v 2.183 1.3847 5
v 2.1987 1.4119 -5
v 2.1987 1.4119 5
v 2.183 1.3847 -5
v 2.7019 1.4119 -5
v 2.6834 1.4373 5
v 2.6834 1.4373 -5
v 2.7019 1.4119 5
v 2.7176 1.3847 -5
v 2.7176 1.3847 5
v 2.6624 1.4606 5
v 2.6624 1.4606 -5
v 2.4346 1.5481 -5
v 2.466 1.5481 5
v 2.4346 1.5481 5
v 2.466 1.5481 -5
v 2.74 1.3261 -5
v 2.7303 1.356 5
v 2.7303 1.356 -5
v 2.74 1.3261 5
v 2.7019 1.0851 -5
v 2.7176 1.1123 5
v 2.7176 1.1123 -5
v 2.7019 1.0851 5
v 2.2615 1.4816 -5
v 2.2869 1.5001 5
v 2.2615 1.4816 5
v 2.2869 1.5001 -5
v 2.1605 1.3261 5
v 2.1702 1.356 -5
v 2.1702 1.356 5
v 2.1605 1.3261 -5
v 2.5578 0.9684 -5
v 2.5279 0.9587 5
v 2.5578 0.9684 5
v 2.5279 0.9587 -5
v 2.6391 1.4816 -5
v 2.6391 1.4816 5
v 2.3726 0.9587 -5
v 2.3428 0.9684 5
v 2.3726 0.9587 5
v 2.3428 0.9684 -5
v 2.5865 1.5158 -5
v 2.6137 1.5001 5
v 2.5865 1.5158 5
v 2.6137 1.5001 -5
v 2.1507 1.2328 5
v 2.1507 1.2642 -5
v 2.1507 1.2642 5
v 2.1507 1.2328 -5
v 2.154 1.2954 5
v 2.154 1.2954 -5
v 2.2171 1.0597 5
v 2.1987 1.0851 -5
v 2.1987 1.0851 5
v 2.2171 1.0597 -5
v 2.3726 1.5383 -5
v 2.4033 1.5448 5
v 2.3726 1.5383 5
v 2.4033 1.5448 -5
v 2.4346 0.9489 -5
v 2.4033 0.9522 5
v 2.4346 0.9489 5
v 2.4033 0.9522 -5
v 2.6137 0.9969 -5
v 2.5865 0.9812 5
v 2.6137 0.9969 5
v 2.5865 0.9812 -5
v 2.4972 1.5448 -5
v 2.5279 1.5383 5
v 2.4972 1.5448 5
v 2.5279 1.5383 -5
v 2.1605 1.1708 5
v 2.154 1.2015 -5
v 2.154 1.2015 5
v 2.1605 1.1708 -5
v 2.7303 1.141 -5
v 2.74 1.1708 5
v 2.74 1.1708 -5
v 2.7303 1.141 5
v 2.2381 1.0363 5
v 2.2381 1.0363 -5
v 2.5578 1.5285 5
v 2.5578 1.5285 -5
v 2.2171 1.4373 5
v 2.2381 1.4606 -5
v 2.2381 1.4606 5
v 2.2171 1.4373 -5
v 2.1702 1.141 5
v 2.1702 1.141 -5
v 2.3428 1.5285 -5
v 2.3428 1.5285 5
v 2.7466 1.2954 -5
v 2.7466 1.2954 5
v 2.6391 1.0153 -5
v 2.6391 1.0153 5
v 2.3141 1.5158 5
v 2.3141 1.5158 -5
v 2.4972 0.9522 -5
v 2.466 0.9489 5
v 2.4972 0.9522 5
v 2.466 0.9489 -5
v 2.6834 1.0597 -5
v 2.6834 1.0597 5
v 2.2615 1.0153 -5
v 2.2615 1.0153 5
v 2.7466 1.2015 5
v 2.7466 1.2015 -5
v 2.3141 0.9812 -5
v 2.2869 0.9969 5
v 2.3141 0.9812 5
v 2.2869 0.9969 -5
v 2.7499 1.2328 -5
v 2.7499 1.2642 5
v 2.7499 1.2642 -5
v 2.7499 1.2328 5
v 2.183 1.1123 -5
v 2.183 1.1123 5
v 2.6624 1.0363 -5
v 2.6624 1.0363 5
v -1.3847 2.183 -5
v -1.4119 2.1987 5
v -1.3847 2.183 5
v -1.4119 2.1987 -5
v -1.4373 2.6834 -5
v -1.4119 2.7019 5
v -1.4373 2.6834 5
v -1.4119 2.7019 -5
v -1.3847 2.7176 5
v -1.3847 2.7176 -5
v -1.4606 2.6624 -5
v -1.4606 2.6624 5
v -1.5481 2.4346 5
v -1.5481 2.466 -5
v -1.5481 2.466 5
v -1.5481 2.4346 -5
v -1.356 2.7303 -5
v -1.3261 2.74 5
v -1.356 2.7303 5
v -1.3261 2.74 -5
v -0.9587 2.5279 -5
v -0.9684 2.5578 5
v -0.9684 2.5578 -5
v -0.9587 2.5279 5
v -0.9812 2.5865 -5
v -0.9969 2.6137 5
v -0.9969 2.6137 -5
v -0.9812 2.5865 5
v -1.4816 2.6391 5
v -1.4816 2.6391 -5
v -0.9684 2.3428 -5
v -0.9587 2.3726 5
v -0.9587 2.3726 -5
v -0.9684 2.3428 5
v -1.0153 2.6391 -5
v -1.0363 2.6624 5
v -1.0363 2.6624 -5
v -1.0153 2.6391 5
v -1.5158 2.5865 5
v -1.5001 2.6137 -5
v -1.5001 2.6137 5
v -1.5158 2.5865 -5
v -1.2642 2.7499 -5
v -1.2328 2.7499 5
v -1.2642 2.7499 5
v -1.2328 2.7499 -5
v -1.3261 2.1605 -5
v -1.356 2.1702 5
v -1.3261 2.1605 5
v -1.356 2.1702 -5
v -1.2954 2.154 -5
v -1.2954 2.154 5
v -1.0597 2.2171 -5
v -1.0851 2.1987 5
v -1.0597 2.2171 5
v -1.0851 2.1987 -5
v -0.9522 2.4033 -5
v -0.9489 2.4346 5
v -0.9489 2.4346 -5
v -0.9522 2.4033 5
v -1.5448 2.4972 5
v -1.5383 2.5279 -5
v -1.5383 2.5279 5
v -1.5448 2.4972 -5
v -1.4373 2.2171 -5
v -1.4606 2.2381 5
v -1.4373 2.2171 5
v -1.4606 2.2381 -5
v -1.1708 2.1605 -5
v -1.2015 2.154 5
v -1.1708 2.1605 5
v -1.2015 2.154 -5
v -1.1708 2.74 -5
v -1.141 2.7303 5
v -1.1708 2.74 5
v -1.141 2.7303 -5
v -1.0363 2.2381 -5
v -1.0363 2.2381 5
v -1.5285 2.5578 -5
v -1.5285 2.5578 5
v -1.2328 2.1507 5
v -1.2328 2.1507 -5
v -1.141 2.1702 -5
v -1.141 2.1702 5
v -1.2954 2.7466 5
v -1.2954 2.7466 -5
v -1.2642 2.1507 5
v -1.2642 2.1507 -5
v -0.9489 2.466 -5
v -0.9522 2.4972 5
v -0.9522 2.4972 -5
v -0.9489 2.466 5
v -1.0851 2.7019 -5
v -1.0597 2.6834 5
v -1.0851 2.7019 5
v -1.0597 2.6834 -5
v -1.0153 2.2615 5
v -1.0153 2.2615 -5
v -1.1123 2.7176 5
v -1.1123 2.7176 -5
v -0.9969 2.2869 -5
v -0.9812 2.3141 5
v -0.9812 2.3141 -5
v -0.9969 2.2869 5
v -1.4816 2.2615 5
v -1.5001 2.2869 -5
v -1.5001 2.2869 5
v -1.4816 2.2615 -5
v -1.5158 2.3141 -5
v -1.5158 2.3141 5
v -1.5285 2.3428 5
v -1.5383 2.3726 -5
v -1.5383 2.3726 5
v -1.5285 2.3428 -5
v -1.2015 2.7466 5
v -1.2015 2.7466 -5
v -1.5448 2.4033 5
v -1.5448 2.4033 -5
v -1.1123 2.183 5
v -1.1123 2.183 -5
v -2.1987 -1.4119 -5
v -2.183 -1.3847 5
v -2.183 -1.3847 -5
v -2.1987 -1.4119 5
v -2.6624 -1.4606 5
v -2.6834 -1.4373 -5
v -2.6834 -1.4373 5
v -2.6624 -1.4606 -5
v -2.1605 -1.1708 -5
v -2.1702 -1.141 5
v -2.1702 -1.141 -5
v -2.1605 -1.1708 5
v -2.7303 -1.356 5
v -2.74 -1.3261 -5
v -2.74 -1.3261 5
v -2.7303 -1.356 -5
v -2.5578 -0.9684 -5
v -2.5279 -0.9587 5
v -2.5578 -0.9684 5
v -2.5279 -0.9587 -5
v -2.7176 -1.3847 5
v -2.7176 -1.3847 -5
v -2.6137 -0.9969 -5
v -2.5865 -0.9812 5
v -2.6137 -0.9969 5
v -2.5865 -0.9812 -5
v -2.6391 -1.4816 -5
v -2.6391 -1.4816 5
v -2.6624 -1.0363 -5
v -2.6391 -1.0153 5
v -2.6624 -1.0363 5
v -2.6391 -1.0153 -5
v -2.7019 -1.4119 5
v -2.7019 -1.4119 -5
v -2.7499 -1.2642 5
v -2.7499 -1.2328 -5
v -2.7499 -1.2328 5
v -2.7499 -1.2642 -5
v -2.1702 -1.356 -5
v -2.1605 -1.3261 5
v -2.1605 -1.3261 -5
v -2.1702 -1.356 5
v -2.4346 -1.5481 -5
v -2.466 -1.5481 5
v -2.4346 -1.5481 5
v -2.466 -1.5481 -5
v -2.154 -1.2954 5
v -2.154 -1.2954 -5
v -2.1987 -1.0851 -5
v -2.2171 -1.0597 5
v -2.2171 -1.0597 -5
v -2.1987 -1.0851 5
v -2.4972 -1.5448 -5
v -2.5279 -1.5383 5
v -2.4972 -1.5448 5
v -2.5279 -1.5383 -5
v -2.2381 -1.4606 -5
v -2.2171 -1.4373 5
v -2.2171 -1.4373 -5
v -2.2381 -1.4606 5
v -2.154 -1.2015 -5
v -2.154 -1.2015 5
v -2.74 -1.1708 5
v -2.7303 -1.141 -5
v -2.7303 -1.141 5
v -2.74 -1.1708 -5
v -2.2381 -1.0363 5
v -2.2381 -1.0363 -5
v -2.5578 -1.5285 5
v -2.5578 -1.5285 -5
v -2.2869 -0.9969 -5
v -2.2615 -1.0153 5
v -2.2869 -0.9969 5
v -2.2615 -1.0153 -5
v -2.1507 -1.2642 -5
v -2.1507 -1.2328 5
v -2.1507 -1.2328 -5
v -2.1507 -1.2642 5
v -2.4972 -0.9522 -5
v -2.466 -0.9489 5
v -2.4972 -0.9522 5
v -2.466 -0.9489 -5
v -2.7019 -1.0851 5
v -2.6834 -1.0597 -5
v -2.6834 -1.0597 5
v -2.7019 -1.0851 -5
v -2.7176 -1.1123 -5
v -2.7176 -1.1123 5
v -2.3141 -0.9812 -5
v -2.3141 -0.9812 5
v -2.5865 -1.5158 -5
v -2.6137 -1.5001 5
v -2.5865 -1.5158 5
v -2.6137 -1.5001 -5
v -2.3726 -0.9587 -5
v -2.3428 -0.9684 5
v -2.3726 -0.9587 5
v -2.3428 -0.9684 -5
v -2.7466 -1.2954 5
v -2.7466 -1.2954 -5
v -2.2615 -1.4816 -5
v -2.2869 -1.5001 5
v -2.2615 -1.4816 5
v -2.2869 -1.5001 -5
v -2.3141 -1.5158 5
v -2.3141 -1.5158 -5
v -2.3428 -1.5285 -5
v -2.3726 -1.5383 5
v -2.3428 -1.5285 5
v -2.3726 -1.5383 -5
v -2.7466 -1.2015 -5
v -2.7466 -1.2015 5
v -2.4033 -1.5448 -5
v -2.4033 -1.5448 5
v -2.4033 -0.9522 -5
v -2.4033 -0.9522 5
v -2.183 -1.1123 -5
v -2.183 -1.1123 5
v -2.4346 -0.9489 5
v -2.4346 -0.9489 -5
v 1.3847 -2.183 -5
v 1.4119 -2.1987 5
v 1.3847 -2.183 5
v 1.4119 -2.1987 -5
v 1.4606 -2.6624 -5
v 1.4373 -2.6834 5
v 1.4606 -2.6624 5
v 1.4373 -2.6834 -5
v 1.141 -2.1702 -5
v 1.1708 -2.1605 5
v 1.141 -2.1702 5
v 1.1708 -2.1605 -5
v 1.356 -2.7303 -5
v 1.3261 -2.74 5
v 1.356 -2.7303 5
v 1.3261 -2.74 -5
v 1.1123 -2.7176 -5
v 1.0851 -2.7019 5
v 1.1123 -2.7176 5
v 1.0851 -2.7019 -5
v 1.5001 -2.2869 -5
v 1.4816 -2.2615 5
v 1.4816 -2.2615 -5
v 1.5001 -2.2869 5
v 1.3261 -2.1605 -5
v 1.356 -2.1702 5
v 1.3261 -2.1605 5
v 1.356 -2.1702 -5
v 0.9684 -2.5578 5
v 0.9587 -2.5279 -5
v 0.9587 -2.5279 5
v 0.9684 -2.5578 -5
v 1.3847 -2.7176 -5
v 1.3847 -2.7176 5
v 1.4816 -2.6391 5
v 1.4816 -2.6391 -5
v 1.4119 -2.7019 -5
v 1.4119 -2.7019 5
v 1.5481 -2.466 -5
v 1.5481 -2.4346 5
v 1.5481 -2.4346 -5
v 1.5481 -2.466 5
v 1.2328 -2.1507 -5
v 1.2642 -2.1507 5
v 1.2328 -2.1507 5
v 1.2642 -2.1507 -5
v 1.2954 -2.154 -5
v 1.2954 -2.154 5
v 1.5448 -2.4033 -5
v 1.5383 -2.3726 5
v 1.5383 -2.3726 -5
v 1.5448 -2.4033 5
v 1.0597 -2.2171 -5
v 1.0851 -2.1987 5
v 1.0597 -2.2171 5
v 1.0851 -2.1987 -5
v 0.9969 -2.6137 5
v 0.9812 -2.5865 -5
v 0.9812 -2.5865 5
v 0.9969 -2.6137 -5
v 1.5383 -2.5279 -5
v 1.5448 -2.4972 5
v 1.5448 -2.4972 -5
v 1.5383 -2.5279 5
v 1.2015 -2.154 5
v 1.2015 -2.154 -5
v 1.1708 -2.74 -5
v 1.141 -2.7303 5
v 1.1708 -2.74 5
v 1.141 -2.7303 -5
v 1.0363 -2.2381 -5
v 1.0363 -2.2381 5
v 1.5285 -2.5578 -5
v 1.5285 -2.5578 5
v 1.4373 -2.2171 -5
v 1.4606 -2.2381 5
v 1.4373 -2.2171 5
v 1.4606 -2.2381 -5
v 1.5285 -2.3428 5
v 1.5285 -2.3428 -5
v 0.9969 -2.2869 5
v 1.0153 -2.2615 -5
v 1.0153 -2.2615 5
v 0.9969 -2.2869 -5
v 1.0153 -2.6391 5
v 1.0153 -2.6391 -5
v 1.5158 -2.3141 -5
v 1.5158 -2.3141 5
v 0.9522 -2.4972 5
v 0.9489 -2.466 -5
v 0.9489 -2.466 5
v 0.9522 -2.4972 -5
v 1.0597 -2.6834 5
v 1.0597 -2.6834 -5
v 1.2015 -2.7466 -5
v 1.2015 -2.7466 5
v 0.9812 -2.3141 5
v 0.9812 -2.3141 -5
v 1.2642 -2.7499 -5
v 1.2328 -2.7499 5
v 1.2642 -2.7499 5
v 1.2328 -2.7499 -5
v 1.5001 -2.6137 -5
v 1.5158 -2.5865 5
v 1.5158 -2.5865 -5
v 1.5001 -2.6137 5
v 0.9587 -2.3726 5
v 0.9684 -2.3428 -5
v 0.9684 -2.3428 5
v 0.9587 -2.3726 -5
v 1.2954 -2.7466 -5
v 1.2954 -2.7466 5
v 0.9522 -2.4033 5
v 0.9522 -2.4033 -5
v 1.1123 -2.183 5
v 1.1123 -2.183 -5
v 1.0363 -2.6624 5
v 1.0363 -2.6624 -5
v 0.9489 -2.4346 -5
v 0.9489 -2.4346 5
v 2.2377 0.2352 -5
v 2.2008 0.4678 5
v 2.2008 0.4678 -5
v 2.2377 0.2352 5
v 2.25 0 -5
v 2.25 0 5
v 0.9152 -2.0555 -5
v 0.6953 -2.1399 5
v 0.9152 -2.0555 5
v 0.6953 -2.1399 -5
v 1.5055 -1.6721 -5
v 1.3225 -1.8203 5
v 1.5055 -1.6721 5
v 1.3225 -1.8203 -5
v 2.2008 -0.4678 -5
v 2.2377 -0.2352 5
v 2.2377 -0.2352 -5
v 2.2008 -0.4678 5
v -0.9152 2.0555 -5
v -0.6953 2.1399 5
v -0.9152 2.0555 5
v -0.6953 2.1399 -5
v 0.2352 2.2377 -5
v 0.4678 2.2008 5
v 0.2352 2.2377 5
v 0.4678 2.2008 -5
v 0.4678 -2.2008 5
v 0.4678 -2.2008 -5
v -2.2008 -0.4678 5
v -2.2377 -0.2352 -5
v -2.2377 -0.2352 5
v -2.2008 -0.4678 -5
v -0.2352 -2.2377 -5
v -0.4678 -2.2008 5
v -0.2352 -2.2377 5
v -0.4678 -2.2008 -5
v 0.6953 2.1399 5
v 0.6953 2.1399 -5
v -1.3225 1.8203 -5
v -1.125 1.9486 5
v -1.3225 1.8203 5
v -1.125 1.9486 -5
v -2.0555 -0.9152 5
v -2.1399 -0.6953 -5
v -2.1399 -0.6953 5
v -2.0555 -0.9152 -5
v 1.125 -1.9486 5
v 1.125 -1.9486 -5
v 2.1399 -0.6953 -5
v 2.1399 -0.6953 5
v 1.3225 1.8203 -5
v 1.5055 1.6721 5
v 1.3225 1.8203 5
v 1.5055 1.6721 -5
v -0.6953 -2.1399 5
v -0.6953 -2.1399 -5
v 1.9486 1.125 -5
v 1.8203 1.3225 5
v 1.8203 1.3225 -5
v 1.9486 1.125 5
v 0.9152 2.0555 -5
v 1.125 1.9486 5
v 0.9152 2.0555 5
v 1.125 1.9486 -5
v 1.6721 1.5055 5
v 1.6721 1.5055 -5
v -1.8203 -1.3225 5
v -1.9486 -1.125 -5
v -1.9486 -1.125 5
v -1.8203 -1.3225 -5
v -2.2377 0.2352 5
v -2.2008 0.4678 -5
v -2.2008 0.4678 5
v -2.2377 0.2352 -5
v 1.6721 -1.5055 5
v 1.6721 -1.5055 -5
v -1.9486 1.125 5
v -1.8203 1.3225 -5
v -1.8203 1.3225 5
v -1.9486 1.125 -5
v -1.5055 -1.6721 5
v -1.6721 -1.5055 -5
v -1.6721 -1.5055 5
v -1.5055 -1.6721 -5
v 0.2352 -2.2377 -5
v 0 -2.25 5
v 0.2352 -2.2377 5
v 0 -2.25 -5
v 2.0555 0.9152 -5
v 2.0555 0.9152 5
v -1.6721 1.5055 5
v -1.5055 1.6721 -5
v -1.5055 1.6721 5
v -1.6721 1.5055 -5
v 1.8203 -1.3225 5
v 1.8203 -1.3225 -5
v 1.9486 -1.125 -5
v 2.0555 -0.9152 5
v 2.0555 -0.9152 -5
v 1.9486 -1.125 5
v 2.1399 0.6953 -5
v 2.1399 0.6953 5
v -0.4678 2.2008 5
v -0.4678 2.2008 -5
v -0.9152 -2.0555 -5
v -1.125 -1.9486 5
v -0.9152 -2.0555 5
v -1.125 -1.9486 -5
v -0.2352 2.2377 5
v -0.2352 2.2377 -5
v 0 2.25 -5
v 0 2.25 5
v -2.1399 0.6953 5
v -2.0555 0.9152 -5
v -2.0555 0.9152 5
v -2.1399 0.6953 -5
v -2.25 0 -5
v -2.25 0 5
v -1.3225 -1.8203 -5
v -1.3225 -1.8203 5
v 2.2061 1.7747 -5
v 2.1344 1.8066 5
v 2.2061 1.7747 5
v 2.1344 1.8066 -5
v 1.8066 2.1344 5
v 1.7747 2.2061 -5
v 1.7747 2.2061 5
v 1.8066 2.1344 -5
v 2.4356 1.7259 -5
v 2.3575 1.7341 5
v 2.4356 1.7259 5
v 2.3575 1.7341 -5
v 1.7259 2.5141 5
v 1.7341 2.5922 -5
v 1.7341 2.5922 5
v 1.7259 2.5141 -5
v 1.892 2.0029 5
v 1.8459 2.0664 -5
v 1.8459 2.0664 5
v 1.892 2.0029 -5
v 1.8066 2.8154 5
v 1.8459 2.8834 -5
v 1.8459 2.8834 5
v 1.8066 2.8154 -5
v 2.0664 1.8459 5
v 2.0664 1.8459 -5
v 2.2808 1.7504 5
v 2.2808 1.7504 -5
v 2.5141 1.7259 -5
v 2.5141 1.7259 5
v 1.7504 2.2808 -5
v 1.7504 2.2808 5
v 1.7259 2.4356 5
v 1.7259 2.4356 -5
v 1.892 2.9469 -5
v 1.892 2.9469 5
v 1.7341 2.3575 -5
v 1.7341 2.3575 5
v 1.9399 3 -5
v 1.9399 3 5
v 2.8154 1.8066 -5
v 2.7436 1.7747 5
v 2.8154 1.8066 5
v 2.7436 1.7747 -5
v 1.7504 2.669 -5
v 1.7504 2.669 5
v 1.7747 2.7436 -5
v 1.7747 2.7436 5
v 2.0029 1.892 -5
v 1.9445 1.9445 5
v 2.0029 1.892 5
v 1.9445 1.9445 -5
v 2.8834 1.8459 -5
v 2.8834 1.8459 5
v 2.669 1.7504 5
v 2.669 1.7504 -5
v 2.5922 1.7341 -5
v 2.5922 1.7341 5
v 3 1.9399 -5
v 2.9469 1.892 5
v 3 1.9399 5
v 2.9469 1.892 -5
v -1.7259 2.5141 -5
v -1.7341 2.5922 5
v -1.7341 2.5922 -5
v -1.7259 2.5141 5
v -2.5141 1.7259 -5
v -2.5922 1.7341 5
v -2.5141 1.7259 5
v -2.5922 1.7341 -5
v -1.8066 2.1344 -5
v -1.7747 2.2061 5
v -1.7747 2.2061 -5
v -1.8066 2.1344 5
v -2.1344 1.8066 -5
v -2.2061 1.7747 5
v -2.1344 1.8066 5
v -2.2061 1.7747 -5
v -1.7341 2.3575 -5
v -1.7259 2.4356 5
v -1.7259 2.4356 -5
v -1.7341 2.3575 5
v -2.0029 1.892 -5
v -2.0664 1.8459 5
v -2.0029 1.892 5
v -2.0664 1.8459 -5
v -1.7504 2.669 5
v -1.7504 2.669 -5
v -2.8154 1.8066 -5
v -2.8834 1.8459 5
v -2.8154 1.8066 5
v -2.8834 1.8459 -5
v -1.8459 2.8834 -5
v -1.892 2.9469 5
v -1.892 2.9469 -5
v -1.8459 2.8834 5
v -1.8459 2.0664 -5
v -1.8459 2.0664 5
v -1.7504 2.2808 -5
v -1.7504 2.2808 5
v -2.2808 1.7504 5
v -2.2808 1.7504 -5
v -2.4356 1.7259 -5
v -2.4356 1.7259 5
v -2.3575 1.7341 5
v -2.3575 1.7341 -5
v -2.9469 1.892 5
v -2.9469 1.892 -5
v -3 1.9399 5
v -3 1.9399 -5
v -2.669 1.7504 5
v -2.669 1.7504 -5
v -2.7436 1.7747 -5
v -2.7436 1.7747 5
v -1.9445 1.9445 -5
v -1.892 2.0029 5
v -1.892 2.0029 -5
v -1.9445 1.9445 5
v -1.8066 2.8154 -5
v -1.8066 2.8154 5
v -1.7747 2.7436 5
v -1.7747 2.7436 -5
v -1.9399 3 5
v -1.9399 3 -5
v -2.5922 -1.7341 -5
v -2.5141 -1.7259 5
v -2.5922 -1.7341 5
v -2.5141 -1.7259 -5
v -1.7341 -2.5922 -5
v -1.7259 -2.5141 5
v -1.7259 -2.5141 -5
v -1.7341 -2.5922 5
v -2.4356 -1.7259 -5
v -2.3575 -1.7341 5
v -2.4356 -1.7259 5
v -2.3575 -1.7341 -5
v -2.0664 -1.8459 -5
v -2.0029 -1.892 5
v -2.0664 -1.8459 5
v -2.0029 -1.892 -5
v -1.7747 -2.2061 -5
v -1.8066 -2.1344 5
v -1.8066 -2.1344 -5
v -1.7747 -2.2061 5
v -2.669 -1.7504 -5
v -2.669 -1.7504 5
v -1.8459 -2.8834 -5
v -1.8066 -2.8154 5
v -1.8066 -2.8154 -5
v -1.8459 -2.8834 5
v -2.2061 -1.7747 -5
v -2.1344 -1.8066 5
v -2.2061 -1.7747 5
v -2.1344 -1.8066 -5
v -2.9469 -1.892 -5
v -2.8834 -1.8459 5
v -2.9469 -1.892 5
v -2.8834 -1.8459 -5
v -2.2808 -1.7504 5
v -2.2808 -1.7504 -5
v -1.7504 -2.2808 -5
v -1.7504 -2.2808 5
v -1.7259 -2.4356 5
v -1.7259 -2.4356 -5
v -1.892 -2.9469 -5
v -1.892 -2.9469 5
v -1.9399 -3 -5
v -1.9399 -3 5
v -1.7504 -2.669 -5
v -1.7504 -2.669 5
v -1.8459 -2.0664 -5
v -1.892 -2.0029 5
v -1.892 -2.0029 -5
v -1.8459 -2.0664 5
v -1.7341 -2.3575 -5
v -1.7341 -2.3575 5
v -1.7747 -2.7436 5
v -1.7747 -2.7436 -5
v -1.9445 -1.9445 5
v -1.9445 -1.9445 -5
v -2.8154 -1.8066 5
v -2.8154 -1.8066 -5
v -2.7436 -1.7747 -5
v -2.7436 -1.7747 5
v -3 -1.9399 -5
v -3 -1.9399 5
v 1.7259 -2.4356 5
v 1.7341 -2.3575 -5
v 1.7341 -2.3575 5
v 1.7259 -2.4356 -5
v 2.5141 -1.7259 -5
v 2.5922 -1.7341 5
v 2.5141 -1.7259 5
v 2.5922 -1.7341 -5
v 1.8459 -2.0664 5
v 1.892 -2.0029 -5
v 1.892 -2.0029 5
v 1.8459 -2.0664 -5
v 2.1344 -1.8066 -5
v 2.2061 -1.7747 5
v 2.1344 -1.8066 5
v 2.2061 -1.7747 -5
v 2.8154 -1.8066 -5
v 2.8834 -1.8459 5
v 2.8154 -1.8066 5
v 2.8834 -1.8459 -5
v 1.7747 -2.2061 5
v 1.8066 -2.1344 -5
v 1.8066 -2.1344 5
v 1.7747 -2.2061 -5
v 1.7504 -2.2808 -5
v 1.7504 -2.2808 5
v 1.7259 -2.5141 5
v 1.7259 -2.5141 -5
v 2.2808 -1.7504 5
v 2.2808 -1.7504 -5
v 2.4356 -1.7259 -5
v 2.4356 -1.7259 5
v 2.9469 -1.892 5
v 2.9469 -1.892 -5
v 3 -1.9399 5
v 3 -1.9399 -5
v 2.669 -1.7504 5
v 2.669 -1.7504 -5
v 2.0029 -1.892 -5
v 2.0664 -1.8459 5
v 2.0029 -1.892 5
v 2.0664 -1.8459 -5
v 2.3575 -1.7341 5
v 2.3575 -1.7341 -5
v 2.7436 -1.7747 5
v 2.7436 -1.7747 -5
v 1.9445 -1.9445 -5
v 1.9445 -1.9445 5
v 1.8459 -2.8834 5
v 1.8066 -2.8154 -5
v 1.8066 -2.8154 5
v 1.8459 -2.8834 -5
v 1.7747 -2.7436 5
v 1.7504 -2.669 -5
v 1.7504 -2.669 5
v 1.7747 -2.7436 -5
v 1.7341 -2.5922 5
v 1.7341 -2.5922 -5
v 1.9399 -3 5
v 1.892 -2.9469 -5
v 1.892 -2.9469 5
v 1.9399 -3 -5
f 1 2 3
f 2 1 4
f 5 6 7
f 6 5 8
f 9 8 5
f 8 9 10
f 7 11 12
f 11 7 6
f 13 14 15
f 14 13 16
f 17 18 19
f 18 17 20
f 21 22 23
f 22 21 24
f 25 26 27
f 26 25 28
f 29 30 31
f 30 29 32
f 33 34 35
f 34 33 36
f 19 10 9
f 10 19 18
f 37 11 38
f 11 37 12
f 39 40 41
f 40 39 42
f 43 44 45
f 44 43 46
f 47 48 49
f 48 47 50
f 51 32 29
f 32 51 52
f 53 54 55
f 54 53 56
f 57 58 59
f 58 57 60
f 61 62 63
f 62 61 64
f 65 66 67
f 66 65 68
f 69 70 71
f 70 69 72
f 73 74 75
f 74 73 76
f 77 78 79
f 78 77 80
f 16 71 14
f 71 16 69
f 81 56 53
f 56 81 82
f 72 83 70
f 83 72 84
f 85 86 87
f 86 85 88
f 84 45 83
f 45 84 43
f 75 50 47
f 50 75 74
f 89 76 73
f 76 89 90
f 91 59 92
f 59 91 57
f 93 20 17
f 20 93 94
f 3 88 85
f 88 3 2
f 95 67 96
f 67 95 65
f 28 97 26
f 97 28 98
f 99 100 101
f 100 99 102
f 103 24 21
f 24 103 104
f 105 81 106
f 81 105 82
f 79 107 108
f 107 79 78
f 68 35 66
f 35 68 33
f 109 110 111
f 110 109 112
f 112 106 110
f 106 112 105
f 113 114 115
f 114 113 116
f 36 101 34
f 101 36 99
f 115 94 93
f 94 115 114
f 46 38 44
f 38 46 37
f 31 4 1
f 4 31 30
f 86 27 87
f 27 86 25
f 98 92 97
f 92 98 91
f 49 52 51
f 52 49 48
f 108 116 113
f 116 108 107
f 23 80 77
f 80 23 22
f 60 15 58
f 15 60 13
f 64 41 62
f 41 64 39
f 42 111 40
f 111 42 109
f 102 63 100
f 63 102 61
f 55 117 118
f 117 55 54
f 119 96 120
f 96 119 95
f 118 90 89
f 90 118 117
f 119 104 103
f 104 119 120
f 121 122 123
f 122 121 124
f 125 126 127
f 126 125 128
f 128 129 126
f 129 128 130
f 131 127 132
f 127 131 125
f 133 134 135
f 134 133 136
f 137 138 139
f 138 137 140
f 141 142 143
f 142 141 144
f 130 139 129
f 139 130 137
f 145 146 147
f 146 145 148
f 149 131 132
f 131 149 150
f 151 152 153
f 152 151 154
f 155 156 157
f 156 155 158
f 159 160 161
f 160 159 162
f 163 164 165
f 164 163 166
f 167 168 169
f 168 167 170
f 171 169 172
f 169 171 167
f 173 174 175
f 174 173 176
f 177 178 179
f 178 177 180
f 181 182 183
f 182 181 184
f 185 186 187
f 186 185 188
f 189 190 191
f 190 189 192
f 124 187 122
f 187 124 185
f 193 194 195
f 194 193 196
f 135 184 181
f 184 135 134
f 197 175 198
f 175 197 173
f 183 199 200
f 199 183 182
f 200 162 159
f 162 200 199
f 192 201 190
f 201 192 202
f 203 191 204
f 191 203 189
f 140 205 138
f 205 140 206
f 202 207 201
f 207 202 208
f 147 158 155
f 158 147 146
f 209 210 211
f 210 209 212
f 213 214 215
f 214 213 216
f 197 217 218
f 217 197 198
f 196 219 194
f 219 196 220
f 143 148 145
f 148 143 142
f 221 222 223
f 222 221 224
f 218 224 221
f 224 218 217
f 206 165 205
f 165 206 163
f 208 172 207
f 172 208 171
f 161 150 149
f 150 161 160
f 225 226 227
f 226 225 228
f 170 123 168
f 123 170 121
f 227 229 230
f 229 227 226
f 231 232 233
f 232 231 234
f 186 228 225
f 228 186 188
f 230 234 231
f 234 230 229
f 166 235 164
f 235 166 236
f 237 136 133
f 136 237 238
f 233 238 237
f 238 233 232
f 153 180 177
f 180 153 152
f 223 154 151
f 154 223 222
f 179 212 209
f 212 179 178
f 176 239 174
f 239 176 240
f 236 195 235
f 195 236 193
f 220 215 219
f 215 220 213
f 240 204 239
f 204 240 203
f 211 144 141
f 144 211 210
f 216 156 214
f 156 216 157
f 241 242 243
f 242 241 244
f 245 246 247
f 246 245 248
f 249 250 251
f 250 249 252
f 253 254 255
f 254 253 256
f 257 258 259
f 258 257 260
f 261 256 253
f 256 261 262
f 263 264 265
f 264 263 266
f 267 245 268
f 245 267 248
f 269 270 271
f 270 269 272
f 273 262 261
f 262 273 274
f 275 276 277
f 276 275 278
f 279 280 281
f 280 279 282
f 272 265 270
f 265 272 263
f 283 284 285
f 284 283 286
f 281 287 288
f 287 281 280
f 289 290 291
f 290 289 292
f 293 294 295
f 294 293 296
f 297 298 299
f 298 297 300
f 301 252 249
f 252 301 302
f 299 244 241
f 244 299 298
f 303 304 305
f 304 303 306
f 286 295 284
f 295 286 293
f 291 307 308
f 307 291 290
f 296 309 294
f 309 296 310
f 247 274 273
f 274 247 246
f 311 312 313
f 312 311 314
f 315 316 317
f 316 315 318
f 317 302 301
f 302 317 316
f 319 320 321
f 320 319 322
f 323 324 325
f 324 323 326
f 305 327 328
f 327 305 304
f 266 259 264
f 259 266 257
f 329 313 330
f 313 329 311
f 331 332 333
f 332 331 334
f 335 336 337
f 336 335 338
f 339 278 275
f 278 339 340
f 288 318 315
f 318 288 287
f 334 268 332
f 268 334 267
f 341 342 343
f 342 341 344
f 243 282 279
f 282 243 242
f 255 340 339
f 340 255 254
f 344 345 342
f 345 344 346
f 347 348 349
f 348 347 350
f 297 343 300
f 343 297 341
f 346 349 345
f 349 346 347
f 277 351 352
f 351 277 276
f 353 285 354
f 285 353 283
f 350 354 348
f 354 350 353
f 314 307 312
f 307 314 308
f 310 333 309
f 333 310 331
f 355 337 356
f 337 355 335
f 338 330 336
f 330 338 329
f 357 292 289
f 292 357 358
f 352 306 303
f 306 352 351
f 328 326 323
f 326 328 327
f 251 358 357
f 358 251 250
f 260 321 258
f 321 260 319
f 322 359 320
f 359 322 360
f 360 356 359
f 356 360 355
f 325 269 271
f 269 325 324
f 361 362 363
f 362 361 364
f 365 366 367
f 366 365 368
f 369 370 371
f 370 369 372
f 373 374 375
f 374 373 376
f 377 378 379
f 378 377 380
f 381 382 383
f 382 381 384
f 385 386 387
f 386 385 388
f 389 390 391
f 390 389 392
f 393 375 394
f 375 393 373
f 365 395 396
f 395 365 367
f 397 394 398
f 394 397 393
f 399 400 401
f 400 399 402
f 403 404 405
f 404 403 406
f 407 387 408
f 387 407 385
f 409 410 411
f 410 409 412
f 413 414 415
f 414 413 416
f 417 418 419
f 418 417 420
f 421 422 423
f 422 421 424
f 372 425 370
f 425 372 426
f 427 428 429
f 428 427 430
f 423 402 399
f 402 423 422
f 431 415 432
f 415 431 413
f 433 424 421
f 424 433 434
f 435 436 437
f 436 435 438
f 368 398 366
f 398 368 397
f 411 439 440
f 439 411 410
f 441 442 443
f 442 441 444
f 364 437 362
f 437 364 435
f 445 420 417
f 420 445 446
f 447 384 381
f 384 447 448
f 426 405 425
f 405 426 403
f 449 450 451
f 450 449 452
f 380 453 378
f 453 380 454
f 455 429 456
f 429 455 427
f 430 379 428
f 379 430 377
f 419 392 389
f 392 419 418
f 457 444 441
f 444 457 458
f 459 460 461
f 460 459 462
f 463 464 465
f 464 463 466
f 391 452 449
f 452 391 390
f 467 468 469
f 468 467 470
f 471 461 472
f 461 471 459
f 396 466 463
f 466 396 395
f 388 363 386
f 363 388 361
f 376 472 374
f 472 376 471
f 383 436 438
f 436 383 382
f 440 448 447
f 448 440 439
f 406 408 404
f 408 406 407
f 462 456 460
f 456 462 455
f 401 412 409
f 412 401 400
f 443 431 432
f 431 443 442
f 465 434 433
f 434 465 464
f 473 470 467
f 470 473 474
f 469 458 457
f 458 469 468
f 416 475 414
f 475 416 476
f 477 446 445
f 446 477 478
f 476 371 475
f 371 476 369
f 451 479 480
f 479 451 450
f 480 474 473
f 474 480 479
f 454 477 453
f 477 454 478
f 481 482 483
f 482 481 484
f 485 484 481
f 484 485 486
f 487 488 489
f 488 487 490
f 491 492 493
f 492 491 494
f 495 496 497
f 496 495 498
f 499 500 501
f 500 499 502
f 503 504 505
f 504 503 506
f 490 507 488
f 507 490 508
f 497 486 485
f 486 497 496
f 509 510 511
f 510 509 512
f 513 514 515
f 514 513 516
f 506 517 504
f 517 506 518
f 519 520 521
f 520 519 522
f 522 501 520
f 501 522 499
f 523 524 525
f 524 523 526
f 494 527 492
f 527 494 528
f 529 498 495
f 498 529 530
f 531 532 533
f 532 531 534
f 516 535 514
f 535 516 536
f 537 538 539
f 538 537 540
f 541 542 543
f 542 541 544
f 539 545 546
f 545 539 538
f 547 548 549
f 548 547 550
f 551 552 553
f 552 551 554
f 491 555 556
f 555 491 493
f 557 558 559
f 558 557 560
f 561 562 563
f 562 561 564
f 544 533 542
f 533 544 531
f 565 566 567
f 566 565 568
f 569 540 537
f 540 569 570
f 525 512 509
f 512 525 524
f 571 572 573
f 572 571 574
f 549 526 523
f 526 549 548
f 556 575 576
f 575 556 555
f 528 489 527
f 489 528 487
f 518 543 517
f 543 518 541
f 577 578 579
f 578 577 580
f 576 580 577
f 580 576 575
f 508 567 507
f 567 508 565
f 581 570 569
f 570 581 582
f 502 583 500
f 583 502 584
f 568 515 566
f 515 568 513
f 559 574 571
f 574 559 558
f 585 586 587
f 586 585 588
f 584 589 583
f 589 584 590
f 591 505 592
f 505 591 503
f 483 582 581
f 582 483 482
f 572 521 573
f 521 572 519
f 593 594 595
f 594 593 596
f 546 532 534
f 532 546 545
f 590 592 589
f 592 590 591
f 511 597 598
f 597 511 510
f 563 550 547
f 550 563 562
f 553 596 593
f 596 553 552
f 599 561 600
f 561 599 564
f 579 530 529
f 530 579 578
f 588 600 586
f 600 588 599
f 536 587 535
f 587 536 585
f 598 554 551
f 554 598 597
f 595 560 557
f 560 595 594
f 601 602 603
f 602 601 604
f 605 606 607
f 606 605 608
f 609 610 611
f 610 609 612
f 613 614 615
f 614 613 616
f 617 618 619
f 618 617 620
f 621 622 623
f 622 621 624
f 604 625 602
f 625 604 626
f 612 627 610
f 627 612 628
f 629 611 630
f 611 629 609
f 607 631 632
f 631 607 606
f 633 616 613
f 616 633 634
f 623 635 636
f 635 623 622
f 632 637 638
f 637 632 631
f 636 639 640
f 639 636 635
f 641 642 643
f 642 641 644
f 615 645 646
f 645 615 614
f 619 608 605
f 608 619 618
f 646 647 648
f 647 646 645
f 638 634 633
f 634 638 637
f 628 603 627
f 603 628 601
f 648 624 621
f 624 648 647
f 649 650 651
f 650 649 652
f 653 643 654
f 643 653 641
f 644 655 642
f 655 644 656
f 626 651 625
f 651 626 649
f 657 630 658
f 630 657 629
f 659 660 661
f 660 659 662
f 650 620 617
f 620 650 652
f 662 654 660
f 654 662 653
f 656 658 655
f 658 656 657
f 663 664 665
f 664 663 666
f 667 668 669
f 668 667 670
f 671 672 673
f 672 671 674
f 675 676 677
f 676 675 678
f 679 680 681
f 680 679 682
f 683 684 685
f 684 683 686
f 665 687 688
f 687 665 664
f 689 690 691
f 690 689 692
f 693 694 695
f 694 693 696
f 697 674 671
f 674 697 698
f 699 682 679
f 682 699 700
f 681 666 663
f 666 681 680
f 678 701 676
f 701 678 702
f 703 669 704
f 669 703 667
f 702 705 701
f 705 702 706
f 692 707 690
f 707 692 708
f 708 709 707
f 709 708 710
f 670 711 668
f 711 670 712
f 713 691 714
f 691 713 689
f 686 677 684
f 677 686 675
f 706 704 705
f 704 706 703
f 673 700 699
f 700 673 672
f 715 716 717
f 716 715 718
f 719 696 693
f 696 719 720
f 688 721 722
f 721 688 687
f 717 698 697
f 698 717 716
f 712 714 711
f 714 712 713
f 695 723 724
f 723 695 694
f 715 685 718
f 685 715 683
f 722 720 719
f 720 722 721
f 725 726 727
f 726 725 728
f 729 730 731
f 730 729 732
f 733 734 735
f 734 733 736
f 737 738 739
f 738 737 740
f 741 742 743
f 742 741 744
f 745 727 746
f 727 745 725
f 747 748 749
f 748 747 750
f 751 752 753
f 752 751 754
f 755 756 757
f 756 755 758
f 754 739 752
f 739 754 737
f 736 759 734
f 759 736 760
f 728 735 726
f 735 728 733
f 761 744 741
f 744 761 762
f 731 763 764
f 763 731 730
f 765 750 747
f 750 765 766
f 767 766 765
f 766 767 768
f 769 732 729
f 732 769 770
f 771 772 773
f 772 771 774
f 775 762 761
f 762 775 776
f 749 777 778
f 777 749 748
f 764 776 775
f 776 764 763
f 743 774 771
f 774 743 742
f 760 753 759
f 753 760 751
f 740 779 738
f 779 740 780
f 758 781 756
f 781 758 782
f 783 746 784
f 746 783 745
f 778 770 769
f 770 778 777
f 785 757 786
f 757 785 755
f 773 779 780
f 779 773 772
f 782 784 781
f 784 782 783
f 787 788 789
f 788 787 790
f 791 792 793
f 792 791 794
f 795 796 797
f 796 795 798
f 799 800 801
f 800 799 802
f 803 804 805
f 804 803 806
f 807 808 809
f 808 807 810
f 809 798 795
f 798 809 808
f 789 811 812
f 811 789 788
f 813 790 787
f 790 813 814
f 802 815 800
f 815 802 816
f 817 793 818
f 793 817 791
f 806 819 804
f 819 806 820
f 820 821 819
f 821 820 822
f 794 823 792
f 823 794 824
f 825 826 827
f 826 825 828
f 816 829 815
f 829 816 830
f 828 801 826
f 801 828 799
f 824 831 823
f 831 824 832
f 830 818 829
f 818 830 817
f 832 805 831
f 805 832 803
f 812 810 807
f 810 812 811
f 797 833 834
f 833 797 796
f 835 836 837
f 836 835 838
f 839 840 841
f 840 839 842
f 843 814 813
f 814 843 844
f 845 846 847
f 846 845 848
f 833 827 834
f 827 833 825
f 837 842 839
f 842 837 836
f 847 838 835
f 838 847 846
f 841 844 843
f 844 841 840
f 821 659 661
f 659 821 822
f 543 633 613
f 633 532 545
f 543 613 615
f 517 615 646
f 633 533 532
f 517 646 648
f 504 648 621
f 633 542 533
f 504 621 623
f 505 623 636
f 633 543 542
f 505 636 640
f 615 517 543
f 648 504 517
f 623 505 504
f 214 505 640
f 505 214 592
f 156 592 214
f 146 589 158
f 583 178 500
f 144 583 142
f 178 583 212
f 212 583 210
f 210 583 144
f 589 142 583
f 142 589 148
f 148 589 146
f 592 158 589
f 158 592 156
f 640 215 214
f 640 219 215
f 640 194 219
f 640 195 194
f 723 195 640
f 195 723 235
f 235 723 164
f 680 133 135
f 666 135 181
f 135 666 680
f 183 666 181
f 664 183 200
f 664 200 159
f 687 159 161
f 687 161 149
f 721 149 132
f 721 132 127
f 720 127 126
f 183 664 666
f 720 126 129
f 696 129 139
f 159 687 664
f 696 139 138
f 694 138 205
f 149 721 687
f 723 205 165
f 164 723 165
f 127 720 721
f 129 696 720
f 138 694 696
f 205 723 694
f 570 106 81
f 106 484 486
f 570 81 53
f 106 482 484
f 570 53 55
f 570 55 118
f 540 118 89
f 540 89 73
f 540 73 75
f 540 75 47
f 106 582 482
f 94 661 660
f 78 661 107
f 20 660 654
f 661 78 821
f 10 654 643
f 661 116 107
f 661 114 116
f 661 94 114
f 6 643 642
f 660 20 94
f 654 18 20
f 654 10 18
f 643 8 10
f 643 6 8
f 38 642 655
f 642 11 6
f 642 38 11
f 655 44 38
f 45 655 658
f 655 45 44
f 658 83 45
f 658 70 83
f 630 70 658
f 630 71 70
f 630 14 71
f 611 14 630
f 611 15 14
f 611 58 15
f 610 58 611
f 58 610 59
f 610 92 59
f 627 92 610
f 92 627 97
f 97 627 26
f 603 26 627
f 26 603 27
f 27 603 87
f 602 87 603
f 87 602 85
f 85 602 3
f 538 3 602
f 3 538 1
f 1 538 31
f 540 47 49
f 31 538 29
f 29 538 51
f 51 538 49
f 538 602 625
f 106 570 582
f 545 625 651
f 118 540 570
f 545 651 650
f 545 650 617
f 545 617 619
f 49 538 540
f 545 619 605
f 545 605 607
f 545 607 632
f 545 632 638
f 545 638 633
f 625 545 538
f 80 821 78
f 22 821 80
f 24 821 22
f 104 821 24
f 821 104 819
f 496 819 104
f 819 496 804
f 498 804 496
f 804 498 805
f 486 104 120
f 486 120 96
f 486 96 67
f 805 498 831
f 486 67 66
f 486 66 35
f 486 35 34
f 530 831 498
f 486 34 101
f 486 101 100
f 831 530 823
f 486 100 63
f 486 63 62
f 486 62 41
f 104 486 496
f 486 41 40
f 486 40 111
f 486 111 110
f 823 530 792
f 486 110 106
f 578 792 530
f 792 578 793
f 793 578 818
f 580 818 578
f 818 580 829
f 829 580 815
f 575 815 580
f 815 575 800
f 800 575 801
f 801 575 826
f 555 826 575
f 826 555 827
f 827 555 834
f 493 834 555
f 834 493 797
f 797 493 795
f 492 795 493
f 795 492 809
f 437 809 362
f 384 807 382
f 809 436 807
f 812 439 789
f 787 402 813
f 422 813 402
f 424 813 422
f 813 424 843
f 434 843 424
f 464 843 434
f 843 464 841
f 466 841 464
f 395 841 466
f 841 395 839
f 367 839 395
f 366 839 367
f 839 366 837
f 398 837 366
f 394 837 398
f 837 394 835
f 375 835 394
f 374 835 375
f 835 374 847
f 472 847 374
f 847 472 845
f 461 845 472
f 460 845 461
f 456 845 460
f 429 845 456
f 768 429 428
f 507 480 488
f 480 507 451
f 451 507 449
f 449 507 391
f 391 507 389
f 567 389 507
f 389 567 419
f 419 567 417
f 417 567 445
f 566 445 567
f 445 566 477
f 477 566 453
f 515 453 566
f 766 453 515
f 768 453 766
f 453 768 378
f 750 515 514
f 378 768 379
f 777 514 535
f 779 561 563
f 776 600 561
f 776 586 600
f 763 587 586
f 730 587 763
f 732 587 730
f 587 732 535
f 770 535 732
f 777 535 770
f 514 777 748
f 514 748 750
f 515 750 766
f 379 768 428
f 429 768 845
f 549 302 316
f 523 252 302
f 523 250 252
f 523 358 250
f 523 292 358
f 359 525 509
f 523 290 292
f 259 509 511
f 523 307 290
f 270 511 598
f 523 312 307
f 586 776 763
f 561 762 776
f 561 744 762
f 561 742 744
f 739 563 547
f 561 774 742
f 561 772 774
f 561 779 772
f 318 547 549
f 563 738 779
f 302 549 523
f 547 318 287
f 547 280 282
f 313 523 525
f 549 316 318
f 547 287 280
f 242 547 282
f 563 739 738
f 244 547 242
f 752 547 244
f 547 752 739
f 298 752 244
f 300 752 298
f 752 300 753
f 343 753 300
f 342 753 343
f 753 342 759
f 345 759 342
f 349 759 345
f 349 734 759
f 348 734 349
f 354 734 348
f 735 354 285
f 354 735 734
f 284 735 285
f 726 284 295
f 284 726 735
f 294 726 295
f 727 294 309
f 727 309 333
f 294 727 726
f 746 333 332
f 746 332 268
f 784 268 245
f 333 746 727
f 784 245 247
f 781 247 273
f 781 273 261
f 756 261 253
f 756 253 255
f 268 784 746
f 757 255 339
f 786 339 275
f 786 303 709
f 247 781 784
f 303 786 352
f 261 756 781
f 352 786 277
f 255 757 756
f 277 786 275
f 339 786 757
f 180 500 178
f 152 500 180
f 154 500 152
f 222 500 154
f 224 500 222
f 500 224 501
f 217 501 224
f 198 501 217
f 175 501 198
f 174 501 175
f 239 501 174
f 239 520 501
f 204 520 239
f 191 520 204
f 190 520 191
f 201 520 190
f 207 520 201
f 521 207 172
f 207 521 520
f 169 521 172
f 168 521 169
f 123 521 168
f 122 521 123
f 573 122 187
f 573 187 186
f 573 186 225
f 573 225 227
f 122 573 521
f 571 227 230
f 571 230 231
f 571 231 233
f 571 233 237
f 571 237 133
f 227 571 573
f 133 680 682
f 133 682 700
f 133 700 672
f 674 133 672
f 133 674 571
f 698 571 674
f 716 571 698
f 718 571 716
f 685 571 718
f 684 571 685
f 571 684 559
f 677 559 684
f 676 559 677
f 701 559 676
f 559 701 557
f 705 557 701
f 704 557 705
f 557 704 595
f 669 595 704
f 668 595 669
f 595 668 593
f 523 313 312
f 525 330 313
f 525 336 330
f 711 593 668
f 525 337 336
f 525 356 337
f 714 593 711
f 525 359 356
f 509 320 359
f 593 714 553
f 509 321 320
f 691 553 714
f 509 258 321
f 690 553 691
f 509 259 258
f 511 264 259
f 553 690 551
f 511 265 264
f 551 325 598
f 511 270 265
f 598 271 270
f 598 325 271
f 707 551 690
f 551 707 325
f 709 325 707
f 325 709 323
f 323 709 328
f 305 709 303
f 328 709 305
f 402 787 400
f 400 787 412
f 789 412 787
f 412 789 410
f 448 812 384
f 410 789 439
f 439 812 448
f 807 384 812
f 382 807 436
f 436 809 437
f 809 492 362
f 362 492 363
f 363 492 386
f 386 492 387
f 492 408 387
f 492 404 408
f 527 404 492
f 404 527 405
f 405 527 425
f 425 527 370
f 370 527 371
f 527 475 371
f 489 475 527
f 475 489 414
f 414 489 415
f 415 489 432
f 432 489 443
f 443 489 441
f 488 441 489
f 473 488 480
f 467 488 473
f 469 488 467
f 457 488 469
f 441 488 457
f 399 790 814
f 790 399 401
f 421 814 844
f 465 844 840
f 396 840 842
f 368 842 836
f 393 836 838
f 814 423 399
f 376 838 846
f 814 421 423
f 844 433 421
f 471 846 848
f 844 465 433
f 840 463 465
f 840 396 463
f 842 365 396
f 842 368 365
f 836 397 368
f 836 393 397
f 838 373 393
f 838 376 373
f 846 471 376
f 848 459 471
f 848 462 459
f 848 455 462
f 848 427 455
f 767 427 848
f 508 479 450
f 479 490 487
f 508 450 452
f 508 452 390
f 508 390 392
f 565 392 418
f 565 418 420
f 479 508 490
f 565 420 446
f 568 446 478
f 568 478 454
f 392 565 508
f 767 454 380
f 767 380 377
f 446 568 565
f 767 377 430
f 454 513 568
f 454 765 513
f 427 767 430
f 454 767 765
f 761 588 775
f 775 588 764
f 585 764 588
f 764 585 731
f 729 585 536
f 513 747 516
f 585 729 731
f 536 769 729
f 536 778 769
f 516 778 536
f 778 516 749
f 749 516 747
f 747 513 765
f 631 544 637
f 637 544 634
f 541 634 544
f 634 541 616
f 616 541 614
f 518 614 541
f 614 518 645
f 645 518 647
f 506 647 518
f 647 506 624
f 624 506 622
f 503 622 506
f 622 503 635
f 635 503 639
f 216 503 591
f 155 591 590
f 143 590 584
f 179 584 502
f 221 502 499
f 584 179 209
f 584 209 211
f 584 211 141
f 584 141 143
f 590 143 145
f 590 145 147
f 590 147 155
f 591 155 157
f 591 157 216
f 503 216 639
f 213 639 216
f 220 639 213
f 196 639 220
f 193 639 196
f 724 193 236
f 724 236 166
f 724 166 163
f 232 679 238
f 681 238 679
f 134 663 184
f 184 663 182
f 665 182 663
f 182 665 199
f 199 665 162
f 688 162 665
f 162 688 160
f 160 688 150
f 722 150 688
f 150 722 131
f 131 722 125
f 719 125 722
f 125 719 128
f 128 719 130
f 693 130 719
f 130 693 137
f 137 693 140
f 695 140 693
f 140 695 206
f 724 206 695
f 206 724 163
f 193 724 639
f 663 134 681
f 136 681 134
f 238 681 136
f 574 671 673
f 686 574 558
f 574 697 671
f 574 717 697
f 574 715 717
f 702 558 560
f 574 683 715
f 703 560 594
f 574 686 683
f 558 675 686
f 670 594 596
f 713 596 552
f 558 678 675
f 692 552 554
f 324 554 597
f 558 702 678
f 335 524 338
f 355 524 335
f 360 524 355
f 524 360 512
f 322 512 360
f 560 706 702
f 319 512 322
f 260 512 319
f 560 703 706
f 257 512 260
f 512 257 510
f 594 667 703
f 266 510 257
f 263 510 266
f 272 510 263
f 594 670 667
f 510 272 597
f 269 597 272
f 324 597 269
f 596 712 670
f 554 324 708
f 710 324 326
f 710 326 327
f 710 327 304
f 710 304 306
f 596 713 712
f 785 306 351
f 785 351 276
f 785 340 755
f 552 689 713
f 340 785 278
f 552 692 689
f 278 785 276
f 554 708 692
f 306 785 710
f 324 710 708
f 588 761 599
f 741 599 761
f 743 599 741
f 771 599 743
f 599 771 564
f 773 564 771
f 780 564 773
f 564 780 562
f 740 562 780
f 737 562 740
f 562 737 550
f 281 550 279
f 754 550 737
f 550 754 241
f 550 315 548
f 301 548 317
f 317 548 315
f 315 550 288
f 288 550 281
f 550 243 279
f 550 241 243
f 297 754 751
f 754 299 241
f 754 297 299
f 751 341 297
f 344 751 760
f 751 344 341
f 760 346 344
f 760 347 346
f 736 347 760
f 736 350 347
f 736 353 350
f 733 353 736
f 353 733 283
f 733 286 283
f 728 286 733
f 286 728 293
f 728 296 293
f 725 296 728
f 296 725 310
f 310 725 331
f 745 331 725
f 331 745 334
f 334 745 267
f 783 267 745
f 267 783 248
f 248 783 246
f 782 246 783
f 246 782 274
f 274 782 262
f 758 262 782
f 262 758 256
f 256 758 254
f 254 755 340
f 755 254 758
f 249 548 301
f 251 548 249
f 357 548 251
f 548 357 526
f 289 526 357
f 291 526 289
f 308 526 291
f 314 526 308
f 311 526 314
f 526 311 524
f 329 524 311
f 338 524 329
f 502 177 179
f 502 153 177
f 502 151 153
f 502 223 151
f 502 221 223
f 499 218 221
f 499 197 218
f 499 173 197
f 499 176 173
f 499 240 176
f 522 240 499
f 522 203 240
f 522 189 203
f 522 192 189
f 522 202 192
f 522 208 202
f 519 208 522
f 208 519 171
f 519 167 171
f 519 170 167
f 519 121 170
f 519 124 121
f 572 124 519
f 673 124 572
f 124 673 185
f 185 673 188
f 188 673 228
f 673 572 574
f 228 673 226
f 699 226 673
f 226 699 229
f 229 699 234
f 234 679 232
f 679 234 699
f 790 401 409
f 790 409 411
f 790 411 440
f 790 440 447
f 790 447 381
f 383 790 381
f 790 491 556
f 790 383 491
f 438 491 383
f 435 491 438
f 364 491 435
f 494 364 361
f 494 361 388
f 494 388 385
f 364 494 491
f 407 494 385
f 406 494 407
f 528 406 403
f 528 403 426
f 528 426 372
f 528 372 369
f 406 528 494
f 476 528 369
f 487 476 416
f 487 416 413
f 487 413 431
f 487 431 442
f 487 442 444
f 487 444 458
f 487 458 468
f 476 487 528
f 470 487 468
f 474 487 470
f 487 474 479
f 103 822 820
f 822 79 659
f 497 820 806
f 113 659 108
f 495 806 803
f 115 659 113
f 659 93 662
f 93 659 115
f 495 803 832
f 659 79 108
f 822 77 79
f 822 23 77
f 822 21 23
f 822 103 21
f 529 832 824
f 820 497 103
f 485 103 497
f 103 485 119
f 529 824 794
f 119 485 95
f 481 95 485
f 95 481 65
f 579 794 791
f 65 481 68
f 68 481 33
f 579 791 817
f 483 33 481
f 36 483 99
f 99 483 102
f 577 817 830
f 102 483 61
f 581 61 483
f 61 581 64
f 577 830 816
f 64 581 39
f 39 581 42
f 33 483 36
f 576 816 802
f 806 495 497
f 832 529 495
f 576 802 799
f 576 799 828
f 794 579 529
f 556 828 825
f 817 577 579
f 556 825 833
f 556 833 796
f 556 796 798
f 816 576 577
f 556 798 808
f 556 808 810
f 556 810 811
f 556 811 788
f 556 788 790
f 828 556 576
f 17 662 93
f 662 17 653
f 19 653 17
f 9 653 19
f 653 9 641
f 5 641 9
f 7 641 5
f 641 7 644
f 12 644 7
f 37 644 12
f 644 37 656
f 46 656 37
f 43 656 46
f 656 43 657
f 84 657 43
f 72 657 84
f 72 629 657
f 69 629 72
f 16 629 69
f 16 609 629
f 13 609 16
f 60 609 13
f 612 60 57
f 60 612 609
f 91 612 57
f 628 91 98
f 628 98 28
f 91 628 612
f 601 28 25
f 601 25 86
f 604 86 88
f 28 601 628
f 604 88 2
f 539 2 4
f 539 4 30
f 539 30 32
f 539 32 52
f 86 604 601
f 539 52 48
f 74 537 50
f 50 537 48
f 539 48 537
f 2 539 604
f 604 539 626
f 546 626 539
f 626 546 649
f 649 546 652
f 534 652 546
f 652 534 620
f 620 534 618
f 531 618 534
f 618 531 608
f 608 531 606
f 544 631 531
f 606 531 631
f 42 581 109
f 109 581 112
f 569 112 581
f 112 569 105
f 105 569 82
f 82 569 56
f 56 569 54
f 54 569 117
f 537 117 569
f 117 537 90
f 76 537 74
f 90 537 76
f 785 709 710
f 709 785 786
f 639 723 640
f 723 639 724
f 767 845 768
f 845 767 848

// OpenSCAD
res = 60;

module cys(r, h, d, a) {
  rotate([0, 0, a])
  translate([d, 0, 0])
  cylinder(r = r, h = h, center = true, $fn = res);
}

difference() {
  cube(size = [6, 6, 10], center = true);

  union() {
    cys(0.3, 20, 2.75, 27);
    cys(0.3, 20, 2.75, 27 + 90);
    cys(0.3, 20, 2.75, 27 + 180);
    cys(0.3, 20, 2.75, 27 + 270);
    
    cys(2.25, 20, 0, 0);
    
    cys(0.75, 20, 3.5, 45);
    cys(0.75, 20, 3.5, 45 + 90);
    cys(0.75, 20, 3.5, 45 + 180);
    cys(0.75, 20, 3.5, 45 + 270);
  }
}
